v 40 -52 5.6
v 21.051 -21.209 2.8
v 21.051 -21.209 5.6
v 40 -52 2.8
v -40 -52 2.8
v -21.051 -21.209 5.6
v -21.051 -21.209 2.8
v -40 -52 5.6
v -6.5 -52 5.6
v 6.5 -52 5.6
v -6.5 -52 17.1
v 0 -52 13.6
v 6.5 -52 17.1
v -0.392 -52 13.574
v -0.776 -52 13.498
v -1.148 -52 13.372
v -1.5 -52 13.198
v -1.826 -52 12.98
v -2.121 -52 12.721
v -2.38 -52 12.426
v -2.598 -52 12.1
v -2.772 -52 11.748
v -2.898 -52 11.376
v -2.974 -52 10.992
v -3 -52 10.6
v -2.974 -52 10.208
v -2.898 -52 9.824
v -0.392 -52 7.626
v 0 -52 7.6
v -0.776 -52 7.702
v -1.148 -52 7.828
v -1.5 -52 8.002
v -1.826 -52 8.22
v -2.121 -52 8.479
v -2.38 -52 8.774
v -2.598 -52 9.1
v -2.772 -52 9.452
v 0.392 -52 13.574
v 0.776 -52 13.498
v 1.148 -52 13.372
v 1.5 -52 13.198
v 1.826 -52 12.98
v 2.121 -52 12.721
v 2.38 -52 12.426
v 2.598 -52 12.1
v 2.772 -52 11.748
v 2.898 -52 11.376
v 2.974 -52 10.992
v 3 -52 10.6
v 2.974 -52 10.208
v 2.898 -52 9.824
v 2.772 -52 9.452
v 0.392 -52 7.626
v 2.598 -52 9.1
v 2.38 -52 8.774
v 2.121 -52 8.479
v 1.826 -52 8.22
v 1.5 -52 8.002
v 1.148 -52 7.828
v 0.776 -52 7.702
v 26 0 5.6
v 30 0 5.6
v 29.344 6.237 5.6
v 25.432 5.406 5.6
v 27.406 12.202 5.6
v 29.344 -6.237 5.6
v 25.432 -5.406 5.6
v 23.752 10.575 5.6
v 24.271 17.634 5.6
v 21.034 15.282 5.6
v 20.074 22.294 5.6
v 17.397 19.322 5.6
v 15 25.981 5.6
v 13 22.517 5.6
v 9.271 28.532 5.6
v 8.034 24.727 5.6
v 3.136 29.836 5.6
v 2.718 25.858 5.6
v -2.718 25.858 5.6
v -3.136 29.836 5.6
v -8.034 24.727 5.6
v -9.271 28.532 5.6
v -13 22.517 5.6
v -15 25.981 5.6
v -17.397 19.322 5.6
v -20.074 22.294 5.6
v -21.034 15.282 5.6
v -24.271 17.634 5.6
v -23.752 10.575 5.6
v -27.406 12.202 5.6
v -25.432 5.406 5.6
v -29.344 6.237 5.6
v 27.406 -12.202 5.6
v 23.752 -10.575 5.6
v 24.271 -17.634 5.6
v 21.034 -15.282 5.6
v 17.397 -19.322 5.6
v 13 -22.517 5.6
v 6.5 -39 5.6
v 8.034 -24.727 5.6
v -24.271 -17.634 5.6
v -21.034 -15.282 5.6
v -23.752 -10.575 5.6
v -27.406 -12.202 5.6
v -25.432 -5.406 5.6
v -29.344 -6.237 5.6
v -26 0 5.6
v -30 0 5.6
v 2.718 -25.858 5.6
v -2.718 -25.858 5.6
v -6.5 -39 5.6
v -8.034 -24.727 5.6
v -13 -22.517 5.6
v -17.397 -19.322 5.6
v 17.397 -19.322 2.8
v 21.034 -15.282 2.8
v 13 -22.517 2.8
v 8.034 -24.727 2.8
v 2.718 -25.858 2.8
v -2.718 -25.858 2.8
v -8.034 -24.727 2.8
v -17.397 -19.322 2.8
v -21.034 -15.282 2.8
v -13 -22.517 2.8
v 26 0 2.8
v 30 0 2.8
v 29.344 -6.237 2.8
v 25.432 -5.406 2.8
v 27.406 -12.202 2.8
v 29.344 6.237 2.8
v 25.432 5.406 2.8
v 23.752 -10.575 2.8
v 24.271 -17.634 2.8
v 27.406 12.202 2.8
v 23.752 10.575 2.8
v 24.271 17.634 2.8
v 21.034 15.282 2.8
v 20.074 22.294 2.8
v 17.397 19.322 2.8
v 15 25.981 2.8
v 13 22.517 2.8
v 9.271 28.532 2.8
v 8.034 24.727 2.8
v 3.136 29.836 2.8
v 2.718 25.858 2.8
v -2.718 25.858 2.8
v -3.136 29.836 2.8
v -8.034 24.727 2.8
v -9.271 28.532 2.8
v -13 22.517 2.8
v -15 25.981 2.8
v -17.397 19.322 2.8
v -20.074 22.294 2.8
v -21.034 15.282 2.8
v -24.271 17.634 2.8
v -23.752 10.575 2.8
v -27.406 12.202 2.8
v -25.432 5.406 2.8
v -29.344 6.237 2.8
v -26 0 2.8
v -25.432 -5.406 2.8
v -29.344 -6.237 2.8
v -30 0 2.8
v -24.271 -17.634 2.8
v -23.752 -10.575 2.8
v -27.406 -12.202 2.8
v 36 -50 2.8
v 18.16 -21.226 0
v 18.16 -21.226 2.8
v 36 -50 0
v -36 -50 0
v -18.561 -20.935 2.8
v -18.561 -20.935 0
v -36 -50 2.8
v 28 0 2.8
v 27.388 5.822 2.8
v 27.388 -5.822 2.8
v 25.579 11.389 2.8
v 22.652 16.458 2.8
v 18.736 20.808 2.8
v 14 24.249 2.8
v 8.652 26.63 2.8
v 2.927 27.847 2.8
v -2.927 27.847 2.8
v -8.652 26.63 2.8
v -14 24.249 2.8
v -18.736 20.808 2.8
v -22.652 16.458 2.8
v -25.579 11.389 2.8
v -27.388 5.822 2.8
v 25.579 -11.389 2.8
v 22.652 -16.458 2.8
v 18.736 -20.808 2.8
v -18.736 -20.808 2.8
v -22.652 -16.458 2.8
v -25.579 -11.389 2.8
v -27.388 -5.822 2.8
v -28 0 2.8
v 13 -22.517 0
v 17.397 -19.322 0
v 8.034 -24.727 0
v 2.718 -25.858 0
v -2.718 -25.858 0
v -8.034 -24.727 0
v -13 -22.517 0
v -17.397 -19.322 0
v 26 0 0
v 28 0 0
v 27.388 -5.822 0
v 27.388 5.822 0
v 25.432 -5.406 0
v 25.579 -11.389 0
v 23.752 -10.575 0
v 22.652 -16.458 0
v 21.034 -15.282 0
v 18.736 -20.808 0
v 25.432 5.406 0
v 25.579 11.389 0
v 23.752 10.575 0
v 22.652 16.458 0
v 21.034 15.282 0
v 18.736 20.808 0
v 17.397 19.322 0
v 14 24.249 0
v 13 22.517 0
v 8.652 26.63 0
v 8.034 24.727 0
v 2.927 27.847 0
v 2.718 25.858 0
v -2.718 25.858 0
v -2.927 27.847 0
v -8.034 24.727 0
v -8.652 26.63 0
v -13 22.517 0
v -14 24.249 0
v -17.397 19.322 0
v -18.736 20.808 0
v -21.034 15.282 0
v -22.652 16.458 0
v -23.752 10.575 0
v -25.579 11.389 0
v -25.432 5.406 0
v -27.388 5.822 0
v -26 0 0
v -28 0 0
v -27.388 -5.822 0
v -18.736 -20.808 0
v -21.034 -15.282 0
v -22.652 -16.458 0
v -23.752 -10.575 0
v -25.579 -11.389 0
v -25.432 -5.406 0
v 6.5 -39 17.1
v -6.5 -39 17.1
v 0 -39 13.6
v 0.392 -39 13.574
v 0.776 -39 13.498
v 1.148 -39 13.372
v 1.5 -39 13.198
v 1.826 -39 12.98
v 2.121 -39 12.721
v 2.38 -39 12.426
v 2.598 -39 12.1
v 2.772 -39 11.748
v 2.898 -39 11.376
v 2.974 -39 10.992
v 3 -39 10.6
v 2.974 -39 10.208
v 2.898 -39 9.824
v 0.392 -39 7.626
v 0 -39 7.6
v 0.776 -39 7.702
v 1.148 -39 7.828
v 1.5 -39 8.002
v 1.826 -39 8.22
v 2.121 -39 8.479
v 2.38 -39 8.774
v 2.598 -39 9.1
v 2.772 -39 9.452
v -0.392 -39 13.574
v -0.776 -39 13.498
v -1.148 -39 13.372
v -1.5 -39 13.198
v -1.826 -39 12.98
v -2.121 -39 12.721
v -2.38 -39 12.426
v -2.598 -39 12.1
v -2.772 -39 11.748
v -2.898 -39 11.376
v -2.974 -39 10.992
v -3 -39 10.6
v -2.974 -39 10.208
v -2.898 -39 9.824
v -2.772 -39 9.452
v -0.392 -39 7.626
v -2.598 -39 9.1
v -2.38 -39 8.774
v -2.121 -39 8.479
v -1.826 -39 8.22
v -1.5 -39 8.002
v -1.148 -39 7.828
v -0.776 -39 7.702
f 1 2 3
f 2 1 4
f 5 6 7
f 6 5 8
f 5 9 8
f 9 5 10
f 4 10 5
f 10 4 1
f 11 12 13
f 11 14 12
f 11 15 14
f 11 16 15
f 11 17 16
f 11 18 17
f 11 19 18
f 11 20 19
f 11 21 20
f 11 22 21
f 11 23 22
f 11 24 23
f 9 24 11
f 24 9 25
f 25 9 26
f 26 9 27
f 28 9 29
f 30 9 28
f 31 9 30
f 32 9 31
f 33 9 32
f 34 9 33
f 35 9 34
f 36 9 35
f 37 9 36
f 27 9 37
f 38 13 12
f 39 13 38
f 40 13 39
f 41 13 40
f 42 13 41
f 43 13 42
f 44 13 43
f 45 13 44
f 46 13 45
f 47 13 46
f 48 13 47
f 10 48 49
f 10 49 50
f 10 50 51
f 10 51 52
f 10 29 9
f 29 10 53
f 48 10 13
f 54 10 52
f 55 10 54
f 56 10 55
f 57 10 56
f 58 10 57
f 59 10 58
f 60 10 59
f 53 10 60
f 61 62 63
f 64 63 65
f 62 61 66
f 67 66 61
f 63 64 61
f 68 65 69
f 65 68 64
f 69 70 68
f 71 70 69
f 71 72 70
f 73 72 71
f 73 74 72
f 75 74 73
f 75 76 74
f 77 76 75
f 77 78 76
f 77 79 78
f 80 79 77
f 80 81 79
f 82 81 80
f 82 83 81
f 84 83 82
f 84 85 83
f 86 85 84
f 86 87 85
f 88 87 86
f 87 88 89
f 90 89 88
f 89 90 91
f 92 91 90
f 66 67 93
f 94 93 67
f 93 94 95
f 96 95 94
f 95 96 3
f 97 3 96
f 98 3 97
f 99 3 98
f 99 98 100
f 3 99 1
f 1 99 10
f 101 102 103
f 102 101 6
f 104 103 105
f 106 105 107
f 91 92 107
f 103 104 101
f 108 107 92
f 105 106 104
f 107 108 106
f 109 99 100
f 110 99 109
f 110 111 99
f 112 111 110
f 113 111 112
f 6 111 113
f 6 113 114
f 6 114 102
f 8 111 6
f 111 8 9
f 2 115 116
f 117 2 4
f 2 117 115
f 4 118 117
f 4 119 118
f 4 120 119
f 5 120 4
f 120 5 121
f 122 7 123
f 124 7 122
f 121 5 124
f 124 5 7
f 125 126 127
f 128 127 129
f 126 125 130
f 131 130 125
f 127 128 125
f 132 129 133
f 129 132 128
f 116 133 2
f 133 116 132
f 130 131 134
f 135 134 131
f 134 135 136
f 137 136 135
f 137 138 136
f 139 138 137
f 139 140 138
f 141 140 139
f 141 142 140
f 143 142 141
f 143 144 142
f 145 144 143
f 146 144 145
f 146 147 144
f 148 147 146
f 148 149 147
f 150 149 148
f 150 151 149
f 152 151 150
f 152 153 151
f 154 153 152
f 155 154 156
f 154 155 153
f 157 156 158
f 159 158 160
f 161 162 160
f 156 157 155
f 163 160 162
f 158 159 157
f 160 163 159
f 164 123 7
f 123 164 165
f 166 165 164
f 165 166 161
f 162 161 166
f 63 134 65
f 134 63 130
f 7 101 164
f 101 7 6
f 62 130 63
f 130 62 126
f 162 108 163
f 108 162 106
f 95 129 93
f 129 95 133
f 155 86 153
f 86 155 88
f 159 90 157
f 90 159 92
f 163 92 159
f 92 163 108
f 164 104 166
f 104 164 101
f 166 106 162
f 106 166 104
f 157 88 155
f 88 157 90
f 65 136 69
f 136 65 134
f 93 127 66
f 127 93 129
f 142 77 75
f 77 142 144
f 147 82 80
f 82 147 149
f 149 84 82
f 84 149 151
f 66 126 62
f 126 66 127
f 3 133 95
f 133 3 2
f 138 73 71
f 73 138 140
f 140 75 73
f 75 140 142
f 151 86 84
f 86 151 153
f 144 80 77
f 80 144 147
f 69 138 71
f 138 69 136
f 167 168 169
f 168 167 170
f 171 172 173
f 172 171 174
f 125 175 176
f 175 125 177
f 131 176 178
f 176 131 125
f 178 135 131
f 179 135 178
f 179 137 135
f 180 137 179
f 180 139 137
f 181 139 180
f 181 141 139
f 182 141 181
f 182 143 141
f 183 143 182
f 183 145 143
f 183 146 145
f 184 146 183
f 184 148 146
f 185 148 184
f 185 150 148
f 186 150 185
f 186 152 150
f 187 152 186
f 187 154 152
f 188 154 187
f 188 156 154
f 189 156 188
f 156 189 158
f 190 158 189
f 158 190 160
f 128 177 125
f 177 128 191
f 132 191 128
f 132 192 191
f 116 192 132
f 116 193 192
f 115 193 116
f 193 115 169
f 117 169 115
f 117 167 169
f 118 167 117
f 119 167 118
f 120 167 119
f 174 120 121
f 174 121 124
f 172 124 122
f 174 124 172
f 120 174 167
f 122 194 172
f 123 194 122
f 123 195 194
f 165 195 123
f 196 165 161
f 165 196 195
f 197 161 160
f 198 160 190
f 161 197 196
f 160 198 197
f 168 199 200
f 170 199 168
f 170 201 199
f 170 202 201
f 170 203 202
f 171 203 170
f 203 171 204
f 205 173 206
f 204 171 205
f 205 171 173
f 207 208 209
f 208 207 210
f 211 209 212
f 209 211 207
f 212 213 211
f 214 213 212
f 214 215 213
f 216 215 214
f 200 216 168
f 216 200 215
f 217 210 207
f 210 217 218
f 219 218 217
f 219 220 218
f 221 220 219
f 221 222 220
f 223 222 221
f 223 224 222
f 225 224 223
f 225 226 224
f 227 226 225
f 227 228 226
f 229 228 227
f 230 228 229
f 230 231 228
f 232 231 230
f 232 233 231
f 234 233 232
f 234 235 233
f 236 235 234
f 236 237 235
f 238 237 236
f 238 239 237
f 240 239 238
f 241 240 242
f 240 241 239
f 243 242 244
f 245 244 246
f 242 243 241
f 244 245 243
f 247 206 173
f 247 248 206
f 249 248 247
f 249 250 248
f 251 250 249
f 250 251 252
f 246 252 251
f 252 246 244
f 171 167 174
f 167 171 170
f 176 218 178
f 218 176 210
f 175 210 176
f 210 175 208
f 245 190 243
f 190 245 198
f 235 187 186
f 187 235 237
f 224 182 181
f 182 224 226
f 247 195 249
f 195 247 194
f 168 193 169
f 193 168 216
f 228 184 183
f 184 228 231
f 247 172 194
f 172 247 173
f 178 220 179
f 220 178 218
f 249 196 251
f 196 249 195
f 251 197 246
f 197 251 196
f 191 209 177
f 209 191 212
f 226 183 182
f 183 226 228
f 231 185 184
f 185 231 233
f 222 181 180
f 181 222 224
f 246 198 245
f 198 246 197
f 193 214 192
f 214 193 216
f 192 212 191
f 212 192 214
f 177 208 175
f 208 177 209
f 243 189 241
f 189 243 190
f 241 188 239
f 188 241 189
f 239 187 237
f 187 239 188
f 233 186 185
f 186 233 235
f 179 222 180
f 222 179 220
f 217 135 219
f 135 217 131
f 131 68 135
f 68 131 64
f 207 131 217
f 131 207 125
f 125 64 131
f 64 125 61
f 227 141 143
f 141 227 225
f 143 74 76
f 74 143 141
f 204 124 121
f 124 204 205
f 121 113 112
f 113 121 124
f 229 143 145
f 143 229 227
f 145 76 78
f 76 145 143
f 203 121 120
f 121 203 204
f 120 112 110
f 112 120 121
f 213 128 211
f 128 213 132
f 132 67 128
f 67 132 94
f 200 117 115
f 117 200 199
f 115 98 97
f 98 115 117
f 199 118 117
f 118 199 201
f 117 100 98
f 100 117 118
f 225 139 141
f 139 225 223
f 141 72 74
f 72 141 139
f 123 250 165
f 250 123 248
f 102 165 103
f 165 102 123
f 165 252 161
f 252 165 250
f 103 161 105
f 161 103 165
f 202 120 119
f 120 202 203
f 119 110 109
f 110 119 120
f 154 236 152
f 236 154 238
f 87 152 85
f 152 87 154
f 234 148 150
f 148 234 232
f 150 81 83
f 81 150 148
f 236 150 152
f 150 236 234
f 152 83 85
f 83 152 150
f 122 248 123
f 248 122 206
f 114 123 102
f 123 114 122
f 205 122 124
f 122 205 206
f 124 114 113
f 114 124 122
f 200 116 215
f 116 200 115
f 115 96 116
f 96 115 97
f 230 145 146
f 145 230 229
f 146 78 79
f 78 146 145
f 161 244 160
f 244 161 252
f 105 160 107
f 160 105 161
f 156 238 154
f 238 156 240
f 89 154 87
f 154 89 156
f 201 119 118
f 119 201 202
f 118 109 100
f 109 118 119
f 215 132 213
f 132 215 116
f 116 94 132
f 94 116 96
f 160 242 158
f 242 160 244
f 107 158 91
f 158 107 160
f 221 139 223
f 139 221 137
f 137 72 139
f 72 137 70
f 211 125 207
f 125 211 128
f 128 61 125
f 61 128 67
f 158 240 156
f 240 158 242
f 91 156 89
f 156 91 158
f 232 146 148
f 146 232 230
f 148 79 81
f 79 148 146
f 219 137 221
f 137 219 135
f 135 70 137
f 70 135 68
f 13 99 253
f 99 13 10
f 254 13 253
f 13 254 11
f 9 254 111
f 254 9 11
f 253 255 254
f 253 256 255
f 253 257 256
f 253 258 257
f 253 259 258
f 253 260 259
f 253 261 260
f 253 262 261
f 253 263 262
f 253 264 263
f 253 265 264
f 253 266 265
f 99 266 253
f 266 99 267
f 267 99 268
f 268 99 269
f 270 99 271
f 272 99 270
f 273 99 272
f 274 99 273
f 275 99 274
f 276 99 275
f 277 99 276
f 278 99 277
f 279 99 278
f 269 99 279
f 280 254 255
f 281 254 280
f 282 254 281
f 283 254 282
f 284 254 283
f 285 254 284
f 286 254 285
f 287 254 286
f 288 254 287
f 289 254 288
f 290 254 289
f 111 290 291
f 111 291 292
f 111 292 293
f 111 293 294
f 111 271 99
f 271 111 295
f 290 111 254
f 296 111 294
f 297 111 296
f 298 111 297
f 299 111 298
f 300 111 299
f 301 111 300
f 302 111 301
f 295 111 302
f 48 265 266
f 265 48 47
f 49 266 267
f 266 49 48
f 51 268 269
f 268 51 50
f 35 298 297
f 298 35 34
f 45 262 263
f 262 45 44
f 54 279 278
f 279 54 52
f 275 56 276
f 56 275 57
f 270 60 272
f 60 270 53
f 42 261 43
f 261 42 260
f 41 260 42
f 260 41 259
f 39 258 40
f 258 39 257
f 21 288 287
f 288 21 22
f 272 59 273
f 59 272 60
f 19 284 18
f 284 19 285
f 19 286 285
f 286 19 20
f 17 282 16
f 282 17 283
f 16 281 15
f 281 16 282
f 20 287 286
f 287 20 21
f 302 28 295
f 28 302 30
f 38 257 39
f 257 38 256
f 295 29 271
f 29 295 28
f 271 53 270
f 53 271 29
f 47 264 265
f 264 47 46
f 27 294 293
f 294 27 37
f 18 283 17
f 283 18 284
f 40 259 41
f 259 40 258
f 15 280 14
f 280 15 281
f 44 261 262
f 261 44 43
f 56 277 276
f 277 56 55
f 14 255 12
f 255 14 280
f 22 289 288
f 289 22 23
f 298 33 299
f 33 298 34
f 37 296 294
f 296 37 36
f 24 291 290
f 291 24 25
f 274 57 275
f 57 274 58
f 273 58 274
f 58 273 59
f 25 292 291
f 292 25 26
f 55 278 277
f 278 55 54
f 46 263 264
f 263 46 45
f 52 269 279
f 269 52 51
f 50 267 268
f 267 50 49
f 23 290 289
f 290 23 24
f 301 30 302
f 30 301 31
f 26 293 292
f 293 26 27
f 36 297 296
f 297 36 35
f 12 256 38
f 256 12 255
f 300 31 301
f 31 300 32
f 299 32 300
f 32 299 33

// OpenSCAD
$fa = 1;
$fs = 0.4;
bheight = 2.8;
theight = 40.0;


module part_1() {
    difference(){
        union() {
                linear_extrude(theight){
                    polygon(points=[[-8.0,0.0],[-40.0,-52.0],[40.0,-52],[8.0,0.0]]);
                }
                linear_extrude(theight){
                circle($fn = 0, $fa = 12, $fs = 2, r = 30.00);
                }
            }
        
        
        translate([0,0,bheight]) {

            union() {
                linear_extrude(theight){
                    polygon(points=[[-6.0,0.0],[-36.0,-50.0],[36.0,-50],[5.0,0.0]]);
                }
                linear_extrude(theight){
                circle($fn = 0, $fa = 12, $fs = 2, r = 28.00);
                }
            }
        }
    }
}
module part_2() {
    union(){
        difference(){
            union(){
                translate([0,0,bheight]) {

                    union() {
                            linear_extrude(bheight){
                                polygon(points=[[-8.0,0.0],[-40.0,-52.0],[40.0,-52],[8.0,0.0]]);
                            }
                            linear_extrude(bheight){
                            circle($fn = 0, $fa = 12, $fs = 2, r = 30.00);
                            }
                        }
                    
                }
                union() {
                    linear_extrude(bheight){
                        polygon(points=[[-6.0,0.0],[-36.0,-50.0],[36.0,-50],[5.0,0.0]]);
                    }
                    linear_extrude(bheight){
                    circle($fn = 0, $fa = 12, $fs = 2, r = 28.00);
                    }
                }
                
            }
            translate([0,0,-(bheight/2.0)]) {
                linear_extrude(bheight*3.0){
                    circle($fn = 0, $fa = 12, $fs = 2, r = 26.00);
                }
            }

        }
        
            translate([0.0,-45.5,(bheight*2.0)+5.0]) {
                difference(){
                cube(13,10,10,center=true);
                rotate([90,0,0]) { 
                    cylinder(r=3,h=20,center=true);
                }
            }

        }        
    }
}

// part_1()
part_2();
